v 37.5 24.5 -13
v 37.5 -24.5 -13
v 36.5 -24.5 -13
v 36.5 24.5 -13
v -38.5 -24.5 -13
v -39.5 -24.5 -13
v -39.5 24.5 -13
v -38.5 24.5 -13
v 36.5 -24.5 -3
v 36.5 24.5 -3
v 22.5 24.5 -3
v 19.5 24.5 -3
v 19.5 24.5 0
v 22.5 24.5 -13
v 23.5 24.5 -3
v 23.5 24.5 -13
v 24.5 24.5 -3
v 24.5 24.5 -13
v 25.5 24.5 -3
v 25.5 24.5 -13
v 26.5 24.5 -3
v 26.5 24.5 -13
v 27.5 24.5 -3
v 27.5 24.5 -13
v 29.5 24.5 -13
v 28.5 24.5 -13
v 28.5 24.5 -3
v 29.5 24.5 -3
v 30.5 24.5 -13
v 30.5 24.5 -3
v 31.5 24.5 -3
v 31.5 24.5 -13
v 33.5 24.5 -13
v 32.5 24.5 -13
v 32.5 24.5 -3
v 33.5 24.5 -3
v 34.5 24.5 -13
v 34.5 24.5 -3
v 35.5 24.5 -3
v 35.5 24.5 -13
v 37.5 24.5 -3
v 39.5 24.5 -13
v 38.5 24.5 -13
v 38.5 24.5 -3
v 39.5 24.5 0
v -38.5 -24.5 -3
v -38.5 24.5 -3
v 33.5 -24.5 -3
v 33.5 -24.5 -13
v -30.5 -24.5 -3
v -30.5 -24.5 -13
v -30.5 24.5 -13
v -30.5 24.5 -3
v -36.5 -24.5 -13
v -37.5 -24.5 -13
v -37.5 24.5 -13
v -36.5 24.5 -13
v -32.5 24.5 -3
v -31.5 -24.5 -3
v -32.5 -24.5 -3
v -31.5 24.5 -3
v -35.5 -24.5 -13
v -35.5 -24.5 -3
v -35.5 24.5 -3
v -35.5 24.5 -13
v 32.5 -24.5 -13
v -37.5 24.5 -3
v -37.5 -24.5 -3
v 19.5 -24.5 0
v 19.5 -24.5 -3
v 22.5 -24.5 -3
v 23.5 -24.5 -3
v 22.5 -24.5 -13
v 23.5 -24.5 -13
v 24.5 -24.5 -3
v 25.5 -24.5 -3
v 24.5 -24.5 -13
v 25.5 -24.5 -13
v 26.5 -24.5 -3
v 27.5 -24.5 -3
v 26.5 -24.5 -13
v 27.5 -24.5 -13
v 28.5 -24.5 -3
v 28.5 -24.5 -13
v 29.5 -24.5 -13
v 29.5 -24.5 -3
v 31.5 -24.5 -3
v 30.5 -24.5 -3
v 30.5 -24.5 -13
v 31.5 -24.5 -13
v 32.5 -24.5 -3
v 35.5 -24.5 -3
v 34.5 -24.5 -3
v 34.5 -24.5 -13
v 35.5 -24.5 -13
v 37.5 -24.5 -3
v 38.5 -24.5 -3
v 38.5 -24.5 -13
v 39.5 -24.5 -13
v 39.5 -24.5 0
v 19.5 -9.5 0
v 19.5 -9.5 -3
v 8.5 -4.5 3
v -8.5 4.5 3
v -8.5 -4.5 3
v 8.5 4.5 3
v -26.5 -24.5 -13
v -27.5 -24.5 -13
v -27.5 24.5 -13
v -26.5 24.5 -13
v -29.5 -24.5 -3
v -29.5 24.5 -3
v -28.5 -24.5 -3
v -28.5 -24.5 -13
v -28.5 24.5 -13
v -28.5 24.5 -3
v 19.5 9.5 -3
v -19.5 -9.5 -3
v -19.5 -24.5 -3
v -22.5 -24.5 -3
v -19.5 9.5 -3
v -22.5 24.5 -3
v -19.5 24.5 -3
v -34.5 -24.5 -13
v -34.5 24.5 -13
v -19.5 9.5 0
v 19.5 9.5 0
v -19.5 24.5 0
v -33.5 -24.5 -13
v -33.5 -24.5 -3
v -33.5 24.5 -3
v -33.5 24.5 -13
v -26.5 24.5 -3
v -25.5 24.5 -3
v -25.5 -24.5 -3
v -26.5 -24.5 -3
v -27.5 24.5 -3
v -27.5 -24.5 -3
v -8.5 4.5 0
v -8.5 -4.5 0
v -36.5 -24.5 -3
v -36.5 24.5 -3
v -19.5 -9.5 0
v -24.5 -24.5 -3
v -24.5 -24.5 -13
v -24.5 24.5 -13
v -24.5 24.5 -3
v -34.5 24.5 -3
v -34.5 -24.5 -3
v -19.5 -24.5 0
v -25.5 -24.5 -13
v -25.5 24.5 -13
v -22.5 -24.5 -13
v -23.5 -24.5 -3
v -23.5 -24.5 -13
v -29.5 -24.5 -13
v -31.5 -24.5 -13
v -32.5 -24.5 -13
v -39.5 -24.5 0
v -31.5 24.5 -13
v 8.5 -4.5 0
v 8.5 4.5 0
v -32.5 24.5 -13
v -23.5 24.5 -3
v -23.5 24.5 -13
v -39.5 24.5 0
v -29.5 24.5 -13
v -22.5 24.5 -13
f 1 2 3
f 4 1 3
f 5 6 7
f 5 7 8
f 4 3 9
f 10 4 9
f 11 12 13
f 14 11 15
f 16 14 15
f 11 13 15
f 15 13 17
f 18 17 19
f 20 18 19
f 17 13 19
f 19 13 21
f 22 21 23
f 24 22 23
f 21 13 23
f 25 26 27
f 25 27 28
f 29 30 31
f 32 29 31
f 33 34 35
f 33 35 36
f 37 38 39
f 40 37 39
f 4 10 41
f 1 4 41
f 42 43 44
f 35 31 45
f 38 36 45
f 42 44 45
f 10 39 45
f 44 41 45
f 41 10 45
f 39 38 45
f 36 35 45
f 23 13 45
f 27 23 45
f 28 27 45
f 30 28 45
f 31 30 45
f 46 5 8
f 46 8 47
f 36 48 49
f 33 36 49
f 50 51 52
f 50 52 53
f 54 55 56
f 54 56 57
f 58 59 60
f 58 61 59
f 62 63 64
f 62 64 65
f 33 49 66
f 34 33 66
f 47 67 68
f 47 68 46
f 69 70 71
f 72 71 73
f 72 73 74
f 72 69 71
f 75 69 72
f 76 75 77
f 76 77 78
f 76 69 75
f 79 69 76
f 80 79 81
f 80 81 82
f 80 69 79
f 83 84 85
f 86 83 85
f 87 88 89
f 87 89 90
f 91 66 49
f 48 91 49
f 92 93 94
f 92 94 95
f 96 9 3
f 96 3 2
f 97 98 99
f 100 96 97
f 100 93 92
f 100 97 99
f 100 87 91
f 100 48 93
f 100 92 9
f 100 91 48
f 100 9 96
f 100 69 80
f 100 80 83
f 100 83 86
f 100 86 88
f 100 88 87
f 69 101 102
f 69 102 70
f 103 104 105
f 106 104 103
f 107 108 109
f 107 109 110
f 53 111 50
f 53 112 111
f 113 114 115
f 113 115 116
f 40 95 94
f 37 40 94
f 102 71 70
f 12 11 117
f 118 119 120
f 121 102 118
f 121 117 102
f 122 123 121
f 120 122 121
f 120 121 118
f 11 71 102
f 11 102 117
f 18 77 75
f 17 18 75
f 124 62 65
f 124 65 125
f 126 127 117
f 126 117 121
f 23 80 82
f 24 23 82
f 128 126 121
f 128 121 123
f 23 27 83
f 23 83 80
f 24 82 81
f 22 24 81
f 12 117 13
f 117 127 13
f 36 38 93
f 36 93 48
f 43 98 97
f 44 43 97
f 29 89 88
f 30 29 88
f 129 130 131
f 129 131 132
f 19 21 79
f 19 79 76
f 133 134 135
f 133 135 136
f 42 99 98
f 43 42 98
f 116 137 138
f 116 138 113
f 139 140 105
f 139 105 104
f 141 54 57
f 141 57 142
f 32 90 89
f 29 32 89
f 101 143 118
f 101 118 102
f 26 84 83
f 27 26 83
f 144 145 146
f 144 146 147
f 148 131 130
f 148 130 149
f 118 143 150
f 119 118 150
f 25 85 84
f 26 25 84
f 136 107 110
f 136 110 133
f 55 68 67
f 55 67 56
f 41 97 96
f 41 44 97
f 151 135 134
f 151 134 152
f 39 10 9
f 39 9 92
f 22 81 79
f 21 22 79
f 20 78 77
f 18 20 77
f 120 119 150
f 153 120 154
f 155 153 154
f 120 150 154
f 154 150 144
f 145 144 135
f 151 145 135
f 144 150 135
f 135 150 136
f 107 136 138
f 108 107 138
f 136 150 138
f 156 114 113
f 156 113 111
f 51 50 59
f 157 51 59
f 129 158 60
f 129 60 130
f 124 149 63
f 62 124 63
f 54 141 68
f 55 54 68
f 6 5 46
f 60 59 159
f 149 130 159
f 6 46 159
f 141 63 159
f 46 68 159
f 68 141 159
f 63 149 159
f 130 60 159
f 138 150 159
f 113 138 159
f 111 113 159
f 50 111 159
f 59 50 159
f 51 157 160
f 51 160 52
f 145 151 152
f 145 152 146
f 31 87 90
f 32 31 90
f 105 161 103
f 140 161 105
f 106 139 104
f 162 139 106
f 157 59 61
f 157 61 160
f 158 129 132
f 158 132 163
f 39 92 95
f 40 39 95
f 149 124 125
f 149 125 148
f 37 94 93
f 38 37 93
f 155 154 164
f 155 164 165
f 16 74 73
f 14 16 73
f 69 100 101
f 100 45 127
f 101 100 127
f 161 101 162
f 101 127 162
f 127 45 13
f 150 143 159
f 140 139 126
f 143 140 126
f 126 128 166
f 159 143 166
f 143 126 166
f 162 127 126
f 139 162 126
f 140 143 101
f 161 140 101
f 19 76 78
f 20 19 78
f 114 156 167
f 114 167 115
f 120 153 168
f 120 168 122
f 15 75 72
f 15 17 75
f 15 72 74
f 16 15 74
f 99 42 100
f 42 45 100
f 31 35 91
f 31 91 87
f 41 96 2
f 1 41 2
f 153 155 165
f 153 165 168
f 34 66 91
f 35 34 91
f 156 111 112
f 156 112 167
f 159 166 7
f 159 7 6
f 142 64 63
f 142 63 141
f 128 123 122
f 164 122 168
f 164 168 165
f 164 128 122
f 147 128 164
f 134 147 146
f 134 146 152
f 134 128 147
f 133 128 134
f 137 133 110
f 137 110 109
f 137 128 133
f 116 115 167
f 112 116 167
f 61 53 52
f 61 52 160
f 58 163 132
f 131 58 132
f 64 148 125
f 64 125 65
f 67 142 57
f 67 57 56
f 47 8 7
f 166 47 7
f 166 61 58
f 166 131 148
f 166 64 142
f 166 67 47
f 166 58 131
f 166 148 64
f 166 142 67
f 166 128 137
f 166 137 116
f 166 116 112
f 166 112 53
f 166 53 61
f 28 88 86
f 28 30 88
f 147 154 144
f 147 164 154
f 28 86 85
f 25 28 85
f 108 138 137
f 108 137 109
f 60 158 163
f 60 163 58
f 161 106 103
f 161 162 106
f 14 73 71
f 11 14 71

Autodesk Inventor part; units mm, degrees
ref_plane "YZ Plane" through (0, 0, 0) normal (1, 0, 0) x (0, 1, 0)
ref_plane "XZ Plane" through (0, 0, 0) normal (0, 1, 0) x (-1, 0, 0)
ref_plane "XY Plane" through (0, 0, 0) normal (0, 0, 1) x (1, 0, 0)
sketch "Sketch2" plane through (0, 0, 0) normal (0, 0, 1) x (1, 0, 0)
  line L0 (-8.5, 4.5) -> (8.5, 4.5)
  line L1 (8.5, 4.5) -> (8.5, -4.5)
  line L2 (8.5, -4.5) -> (-8.5, -4.5)
  line L3 (-8.5, -4.5) -> (-8.5, 4.5)
  line L4 (8.5, 4.5) -> (-8.5, -4.5) construction
  line L5 (8.5, -4.5) -> (-8.5, 4.5) construction
  point P0 (0, 0)
  dimension "d12" = 17
  dimension "d13" = 9
extrude "Extrusion2" add sketch "Sketch2" along normal blind 3
sketch "Sketch3" plane through (0, 0, 0) normal (0, 0, -1) x (-1, 0, 0)
  line L0 (-19.5, 9.5) -> (19.5, 9.5)
  line L1 (19.5, 9.5) -> (19.5, -9.5)
  line L2 (19.5, -9.5) -> (-19.5, -9.5)
  line L3 (-19.5, -9.5) -> (-19.5, 9.5)
  line L4 (-19.5, 9.5) -> (19.5, -9.5) construction
  line L5 (19.5, 9.5) -> (-19.5, -9.5) construction
  line L6 (8.5, 4.5) -> (-8.5, 4.5) projected
  line L7 (-8.5, 4.5) -> (-8.5, -4.5) projected
  line L8 (19.5, 15) -> (-19.5, 15) construction
  line L9 (-19.5, 15) -> (-19.5, -15) construction
  line L10 (-19.5, -15) -> (19.5, -15) construction
  line L11 (19.5, -15) -> (19.5, 15) construction
  line L12 (19.5, -15) -> (-19.5, 15) construction
  line L13 (-19.5, -15) -> (19.5, 15) construction
  line L14 (-19.5, 24.5) -> (-39.5, 24.5)
  line L15 (-19.5, 9.5) -> (-19.5, 24.5)
  line L16 (-39.5, 24.5) -> (-39.5, 0)
  line L17 (0, 0) -> (15.34, 0) construction
  line L18 (-19.5, -24.5) -> (-39.5, -24.5)
  line L19 (-19.5, -9.5) -> (-19.5, -24.5)
  line L20 (-39.5, -24.5) -> (-39.5, 0)
  line L21 (0, 0) -> (0, 17) construction
  line L22 (19.5, 24.5) -> (39.5, 24.5)
  line L23 (19.5, 9.5) -> (19.5, 24.5)
  line L24 (39.5, 24.5) -> (39.5, 0)
  line L25 (19.5, -9.5) -> (19.5, -24.5)
  line L26 (19.5, -24.5) -> (39.5, -24.5)
  line L27 (39.5, -24.5) -> (39.5, 0)
  dimension "d16" = 11
  dimension "d17" = 5
  dimension "d18" = 39
  dimension "d39" = 19
  dimension "d55" = 39
  dimension "d56" = 30
  dimension "d57" = 15
  dimension "d58" = 20
  dimension "d78" = 49
extrude "Extrusion3" add sketch "Sketch3" along normal blind 3
sketch "Sketch6" plane through (-19.5, 9.5, 0) normal (0, 1, 0) x (1, 0, 0)
  point P0 (19.5, 0)
sketch "Sketch7" plane through (19.5, 24.5, 0) normal (0, 1, 0) x (1, 0, 0)
  line L0 (20, 3) -> (20, 13)
  line L1 (20, 13) -> (19, 13)
  line L2 (19, 13) -> (19, 3)
  line L3 (-19.5, 0) -> (-19.5, 8) construction
  line L4 (20, 3) -> (19, 3)
  line L5 (18, 3) -> (18, 13)
  line L6 (18, 13) -> (17, 13)
  line L7 (17, 13) -> (17, 3)
  line L8 (18, 3) -> (17, 3)
  line L9 (16, 3) -> (16, 13)
  line L10 (16, 13) -> (15, 13)
  line L11 (15, 13) -> (15, 3)
  line L12 (16, 3) -> (15, 3)
  line L13 (14, 3) -> (14, 13)
  line L14 (14, 13) -> (13, 13)
  line L15 (13, 13) -> (13, 3)
  line L16 (14, 3) -> (13, 3)
  line L17 (12, 3) -> (12, 13)
  line L18 (12, 13) -> (11, 13)
  line L19 (11, 13) -> (11, 3)
  line L20 (12, 3) -> (11, 3)
  line L21 (10, 3) -> (10, 13)
  line L22 (10, 13) -> (9, 13)
  line L23 (9, 13) -> (9, 3)
  line L24 (10, 3) -> (9, 3)
  line L25 (8, 3) -> (8, 13)
  line L26 (8, 13) -> (7, 13)
  line L27 (7, 13) -> (7, 3)
  line L28 (8, 3) -> (7, 3)
  line L29 (6, 3) -> (6, 13)
  line L30 (6, 13) -> (5, 13)
  line L31 (5, 13) -> (5, 3)
  line L32 (6, 3) -> (5, 3)
  line L33 (4, 3) -> (4, 13)
  line L34 (4, 13) -> (3, 13)
  line L35 (3, 13) -> (3, 3)
  line L36 (4, 3) -> (3, 3)
  line L37 (0, 0) -> (-39, 0) projected
  line L38 (-59, 3) -> (-59, 13)
  line L39 (-59, 13) -> (-58, 13)
  line L40 (-58, 13) -> (-58, 3)
  line L41 (-59, 3) -> (-58, 3)
  line L42 (-57, 3) -> (-57, 13)
  line L43 (-57, 13) -> (-56, 13)
  line L44 (-56, 13) -> (-56, 3)
  line L45 (-57, 3) -> (-56, 3)
  line L46 (-55, 3) -> (-55, 13)
  line L47 (-55, 13) -> (-54, 13)
  line L48 (-54, 13) -> (-54, 3)
  line L49 (-55, 3) -> (-54, 3)
  line L50 (-53, 3) -> (-53, 13)
  line L51 (-53, 13) -> (-52, 13)
  line L52 (-52, 13) -> (-52, 3)
  line L53 (-53, 3) -> (-52, 3)
  line L54 (-51, 3) -> (-51, 13)
  line L55 (-51, 13) -> (-50, 13)
  line L56 (-50, 13) -> (-50, 3)
  line L57 (-51, 3) -> (-50, 3)
  line L58 (-49, 3) -> (-49, 13)
  line L59 (-49, 13) -> (-48, 13)
  line L60 (-48, 13) -> (-48, 3)
  line L61 (-49, 3) -> (-48, 3)
  line L62 (-47, 3) -> (-47, 13)
  line L63 (-47, 13) -> (-46, 13)
  line L64 (-46, 13) -> (-46, 3)
  line L65 (-47, 3) -> (-46, 3)
  line L66 (-45, 3) -> (-45, 13)
  line L67 (-45, 13) -> (-44, 13)
  line L68 (-44, 13) -> (-44, 3)
  line L69 (-45, 3) -> (-44, 3)
  line L70 (-43, 3) -> (-43, 13)
  line L71 (-43, 13) -> (-42, 13)
  line L72 (-42, 13) -> (-42, 3)
  line L73 (-43, 3) -> (-42, 3)
  dimension "d59" = 10
  dimension "d60" = 1
  dimension "d71" = 2
  dimension "d76" = 79
  dimension "d77" = 3
extrude "Extrusion6" add sketch "Sketch7" against normal blind 49
properties part number "SensorCooler01"
